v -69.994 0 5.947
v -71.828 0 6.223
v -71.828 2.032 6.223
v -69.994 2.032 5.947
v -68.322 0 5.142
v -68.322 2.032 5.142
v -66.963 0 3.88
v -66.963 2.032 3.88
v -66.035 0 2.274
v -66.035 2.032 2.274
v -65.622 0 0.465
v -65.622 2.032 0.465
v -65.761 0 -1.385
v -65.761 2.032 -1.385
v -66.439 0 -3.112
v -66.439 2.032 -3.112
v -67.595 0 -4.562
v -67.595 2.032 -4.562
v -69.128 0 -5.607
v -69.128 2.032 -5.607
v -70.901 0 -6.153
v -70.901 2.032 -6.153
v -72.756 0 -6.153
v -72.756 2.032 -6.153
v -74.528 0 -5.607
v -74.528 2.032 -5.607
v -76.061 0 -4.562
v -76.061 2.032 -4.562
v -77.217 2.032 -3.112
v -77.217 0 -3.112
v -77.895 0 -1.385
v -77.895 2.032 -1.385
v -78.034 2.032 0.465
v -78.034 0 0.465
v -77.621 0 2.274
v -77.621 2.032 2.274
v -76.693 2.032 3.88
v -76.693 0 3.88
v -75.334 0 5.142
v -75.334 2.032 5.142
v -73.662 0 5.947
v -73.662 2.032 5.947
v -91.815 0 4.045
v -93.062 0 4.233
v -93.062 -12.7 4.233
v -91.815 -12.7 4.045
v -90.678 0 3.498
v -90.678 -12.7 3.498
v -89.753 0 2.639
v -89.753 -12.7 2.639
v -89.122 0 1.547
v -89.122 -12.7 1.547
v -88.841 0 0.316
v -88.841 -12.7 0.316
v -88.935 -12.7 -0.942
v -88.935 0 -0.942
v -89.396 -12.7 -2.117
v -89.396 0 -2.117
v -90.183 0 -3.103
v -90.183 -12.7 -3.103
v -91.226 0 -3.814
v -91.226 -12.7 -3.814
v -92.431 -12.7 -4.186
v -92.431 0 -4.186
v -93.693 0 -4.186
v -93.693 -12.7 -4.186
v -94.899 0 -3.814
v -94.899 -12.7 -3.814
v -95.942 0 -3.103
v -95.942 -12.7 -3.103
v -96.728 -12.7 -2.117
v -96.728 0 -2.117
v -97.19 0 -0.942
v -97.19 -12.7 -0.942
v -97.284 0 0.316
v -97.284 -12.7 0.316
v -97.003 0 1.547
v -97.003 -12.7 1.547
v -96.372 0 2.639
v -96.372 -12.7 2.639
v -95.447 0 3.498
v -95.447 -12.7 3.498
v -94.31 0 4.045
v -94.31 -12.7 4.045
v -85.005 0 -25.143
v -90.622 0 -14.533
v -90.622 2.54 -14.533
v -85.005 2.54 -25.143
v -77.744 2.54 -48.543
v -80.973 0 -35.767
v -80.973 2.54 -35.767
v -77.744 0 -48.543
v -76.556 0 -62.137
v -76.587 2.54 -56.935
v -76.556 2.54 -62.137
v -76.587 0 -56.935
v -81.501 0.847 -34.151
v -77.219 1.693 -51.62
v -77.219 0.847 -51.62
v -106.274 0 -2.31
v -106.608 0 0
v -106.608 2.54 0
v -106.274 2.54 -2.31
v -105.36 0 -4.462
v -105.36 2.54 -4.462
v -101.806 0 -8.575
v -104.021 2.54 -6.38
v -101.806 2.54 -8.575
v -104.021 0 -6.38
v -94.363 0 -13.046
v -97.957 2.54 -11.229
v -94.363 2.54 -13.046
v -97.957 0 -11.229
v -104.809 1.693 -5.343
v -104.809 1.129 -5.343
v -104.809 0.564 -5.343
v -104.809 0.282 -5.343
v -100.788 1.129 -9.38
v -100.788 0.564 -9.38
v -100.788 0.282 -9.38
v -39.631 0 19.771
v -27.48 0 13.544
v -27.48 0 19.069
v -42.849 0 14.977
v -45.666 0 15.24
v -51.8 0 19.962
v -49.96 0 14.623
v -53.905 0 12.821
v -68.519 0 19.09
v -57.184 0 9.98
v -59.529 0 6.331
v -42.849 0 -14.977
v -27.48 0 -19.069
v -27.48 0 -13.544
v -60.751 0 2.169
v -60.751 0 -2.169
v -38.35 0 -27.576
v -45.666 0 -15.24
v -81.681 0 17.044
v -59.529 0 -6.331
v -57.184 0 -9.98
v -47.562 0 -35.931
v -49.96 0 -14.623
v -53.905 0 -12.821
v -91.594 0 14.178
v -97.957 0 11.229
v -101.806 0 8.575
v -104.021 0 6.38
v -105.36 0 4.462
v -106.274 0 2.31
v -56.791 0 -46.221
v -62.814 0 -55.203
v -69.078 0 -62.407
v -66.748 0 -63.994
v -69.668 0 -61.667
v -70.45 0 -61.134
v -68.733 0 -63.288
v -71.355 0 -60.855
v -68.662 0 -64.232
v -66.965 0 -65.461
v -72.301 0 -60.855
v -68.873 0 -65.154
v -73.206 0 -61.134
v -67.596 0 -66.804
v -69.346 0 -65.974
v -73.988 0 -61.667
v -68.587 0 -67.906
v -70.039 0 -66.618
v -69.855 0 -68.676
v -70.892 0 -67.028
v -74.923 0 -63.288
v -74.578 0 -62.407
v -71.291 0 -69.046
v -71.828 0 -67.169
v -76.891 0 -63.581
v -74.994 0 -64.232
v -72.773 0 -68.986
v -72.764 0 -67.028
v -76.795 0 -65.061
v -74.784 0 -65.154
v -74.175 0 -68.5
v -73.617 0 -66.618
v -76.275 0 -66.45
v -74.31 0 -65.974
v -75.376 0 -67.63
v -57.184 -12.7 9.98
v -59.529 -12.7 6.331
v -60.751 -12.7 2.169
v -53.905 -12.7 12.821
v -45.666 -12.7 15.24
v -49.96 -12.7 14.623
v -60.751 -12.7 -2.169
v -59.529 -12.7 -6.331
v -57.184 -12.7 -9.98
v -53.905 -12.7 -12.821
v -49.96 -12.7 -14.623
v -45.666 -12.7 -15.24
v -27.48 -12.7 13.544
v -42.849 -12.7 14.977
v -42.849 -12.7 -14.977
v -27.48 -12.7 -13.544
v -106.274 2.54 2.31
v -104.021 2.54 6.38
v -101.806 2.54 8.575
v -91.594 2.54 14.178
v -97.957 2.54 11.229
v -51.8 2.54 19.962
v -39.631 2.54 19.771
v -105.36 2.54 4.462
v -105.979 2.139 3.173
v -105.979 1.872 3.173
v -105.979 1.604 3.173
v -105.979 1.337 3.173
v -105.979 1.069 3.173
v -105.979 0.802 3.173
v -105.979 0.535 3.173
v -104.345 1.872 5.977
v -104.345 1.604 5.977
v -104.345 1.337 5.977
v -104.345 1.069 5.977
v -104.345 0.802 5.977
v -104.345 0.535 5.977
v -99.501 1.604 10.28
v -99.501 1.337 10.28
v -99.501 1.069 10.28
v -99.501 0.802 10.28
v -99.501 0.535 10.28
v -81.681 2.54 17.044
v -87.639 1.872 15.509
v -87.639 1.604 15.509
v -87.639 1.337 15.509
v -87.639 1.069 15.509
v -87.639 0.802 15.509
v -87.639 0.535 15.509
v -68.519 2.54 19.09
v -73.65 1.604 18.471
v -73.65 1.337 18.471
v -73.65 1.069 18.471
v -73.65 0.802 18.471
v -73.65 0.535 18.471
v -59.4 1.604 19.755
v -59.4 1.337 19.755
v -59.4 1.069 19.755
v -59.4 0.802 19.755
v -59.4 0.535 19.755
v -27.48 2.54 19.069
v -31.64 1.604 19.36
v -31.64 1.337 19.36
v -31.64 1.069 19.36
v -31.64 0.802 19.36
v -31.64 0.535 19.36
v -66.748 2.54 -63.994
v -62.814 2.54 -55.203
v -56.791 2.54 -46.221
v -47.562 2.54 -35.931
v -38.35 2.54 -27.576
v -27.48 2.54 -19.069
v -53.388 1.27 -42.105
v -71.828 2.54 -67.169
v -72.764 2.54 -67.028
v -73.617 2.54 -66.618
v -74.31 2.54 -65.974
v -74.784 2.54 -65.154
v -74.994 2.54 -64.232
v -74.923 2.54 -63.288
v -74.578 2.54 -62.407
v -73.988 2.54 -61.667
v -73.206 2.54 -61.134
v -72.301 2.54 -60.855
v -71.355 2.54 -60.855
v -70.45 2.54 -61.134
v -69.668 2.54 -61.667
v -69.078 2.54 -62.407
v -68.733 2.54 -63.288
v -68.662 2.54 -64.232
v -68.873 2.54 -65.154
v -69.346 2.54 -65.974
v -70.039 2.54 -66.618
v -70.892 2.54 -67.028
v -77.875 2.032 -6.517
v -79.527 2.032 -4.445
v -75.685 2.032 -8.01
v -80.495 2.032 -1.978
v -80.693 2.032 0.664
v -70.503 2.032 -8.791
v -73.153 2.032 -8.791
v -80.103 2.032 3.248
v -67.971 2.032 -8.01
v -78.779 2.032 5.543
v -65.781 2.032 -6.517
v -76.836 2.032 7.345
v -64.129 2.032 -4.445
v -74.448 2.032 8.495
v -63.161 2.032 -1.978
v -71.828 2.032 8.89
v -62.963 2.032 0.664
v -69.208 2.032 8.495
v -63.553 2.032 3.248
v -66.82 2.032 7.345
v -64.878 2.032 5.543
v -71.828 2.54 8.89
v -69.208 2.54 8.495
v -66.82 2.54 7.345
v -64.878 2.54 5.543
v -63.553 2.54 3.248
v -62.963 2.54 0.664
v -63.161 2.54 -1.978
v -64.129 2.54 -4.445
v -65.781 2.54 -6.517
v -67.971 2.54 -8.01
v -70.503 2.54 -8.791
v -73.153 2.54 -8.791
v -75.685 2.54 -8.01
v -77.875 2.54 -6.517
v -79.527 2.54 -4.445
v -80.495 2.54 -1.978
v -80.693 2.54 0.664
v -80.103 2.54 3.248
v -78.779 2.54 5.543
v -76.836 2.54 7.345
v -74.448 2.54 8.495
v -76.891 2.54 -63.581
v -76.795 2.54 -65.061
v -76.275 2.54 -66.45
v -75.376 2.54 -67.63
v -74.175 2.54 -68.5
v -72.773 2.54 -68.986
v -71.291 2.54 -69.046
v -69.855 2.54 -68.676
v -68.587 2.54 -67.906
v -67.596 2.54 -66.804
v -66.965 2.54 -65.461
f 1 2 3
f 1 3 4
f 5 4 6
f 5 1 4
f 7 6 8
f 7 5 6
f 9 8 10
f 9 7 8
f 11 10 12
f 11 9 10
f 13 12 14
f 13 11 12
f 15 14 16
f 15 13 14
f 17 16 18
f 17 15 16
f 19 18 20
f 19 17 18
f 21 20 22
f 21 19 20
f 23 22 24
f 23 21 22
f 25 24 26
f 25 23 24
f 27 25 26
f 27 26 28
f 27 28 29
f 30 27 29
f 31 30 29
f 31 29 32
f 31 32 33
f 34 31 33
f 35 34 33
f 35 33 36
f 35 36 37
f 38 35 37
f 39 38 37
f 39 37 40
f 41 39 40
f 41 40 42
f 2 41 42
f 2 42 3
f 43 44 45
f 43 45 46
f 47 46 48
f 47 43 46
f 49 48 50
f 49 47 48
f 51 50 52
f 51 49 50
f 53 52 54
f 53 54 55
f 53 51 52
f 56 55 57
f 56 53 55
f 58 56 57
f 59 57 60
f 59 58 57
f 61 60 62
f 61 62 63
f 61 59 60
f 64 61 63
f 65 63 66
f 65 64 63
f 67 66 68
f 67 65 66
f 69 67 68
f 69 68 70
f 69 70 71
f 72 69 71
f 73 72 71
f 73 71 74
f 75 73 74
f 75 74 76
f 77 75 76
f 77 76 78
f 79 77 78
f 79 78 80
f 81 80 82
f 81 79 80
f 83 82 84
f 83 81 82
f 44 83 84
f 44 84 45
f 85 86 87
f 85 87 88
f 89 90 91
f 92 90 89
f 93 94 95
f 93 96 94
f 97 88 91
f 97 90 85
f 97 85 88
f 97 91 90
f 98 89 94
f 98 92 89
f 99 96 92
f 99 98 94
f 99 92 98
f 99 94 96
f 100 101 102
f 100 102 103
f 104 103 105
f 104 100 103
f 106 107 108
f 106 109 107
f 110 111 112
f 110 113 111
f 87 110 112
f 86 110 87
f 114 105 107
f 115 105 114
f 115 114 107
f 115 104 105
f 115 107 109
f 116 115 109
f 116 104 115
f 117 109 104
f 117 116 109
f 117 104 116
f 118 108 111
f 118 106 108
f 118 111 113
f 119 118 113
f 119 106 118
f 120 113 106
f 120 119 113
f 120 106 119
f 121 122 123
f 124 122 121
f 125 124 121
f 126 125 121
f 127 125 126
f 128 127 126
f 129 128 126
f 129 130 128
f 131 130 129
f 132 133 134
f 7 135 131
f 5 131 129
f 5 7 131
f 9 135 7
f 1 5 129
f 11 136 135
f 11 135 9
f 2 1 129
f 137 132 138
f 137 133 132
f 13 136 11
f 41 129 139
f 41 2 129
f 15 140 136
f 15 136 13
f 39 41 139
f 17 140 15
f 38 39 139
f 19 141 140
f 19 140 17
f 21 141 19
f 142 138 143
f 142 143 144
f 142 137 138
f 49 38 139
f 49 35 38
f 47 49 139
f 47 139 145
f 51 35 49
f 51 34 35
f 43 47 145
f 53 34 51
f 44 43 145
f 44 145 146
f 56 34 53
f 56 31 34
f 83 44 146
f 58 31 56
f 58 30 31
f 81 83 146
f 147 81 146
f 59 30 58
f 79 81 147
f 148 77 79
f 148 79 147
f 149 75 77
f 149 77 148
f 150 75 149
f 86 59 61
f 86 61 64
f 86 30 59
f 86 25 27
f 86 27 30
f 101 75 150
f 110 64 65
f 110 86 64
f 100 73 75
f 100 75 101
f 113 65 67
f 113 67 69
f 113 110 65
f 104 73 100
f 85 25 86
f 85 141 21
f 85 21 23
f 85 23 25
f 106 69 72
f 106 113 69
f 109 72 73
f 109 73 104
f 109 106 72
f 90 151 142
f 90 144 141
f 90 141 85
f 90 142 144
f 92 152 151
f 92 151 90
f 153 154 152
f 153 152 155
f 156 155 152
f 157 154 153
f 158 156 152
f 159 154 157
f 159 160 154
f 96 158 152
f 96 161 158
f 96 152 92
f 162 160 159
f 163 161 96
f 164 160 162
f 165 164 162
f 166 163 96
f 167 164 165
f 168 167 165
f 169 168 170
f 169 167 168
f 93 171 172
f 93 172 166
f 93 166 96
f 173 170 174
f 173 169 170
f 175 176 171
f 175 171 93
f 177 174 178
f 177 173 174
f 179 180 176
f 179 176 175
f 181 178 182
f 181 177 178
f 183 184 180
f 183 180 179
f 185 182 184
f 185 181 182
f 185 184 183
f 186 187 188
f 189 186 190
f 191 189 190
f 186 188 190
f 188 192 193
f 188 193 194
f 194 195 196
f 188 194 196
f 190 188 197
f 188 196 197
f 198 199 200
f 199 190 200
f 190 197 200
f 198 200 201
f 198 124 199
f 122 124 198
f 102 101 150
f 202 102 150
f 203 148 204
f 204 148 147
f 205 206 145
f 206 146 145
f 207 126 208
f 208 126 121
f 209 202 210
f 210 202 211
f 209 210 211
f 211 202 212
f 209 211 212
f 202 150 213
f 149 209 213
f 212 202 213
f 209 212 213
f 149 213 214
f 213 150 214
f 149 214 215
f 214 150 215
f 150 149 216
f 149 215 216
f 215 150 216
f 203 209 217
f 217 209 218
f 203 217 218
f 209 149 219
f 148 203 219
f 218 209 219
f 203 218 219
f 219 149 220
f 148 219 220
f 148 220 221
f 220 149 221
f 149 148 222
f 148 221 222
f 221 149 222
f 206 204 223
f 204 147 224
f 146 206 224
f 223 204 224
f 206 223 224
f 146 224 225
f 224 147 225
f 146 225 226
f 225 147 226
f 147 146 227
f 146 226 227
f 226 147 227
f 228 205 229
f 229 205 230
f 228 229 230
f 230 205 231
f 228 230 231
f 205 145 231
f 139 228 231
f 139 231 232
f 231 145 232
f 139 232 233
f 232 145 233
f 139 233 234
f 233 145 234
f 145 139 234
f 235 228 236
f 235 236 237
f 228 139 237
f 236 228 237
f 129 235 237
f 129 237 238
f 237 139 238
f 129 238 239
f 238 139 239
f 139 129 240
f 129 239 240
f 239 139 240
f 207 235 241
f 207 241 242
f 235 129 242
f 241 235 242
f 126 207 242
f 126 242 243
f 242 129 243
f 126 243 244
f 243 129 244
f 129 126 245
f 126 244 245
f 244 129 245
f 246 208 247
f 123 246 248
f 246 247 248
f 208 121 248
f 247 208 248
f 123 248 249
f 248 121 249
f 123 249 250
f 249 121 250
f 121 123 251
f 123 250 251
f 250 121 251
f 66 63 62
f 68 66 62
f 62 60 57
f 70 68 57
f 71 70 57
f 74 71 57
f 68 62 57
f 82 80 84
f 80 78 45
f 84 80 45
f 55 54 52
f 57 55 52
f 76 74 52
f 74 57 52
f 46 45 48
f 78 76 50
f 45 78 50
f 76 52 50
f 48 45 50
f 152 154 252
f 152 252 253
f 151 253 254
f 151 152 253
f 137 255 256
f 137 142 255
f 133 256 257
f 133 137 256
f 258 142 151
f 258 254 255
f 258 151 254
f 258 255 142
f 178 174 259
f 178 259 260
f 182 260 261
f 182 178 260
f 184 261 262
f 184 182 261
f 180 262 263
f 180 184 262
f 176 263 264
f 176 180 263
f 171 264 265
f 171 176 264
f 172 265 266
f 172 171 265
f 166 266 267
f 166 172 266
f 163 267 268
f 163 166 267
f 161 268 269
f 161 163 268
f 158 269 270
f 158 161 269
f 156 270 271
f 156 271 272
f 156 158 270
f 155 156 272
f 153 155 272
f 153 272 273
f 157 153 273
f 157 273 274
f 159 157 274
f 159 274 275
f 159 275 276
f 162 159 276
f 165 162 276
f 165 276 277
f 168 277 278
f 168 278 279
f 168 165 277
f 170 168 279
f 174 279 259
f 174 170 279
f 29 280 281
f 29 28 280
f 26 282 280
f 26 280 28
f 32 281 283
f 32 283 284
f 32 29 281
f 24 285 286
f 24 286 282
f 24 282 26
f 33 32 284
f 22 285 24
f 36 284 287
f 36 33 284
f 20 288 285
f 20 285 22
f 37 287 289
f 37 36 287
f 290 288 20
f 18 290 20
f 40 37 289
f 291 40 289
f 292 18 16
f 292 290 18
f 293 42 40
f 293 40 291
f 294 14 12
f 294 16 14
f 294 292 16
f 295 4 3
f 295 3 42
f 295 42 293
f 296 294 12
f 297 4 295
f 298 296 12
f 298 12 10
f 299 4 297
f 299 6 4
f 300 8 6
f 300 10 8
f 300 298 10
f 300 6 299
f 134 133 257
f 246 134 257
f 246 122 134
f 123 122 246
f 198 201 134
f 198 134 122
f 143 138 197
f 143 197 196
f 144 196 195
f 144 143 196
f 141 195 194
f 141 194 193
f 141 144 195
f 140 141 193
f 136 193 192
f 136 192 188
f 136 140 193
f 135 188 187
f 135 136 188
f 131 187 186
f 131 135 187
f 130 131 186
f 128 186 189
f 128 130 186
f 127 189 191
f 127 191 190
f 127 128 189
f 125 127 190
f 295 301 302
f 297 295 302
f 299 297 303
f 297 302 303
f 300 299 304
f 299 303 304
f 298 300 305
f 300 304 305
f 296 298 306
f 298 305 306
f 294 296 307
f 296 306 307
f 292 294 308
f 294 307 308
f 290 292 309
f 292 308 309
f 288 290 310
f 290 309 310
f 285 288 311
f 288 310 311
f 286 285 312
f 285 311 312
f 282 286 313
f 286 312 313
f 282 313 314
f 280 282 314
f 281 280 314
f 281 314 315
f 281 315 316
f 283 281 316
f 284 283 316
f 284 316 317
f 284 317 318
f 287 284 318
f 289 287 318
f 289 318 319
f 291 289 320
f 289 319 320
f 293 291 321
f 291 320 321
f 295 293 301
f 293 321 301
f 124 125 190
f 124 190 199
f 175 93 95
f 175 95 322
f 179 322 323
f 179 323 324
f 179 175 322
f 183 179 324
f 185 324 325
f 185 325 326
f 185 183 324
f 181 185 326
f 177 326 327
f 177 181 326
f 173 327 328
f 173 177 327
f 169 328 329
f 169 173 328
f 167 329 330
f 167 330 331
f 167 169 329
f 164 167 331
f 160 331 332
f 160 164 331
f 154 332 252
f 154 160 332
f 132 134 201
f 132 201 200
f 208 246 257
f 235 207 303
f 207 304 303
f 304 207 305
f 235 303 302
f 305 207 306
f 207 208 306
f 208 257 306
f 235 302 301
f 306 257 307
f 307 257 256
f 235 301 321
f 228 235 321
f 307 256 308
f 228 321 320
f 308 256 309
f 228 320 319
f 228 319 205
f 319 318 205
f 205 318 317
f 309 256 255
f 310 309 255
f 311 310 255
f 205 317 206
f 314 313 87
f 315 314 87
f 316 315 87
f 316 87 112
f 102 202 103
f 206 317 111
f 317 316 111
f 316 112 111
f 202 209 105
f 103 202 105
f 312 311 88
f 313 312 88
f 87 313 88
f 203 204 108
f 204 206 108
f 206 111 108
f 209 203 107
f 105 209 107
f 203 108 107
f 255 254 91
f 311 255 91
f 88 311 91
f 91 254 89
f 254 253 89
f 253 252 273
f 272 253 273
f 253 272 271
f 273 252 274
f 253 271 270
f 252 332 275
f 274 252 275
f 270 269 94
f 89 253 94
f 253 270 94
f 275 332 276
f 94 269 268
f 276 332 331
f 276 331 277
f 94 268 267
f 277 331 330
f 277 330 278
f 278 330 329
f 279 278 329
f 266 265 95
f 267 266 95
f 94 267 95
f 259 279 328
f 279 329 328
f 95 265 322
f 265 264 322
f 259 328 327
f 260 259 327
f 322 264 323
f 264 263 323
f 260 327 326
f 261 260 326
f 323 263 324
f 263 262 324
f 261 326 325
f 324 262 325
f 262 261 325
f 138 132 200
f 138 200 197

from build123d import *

# Parameters (mm, degrees)
SKETCH1_R           = 6.223
SKETCH1_R_2         = 3.175
BOSS_EXTRUDE1_DEPTH = 2.54
SKETCH1_3_R         = 4.233333333
BOSS_EXTRUDE2_DEPTH = 12.7
SKETCH2_R           = 8.89
CUT_EXTRUDE2_DEPTH  = 0.508


with BuildPart() as part:
    # Sketch1 → Boss-Extrude1 (new body)
    with BuildSketch(Plane(origin=(0, 0, 0), x_dir=(1, 0, 0), z_dir=(0, 1, 0))):
        with BuildLine():
            add(Edge.make_bspline(
                [(-106.608177043, 0), (-106.607181853, 0.336221439), (-106.553109217, 1.172470844), (-106.231145111, 2.643099261), (-105.439203383, 4.475217401), (-104.022724766, 6.504348411), (-101.933239026, 8.571651325), (-99.191911488, 10.567556696), (-95.844996836, 12.426747292), (-92.90409582, 13.696332592), (-91.099565345, 14.363844596), (-90.622228407, 14.533411548)],
                knots=[0.5, 0.5, 0.5, 0.5, 0.502166769, 0.505390167, 0.509655974, 0.514947682, 0.521244711, 0.528520886, 0.536744945, 0.54588136, 0.54914681, 0.54914681, 0.54914681, 0.54914681], degree=3))
            add(Edge.make_bspline(
                [(-106.608177043, 0), (-106.607181853, -0.336221439), (-106.553109217, -1.172470844), (-106.231145111, -2.643099261), (-105.439203383, -4.475217401), (-104.022724766, -6.504348411), (-101.933239026, -8.571651325), (-99.191911488, -10.567556696), (-95.844996836, -12.426747292), (-91.942526077, -14.111441704), (-87.531895483, -15.599318155), (-82.657100659, -16.877133316), (-77.359343302, -17.937435613), (-71.677800746, -18.776740565), (-65.650341253, -19.395460579), (-59.313785065, -19.796574023), (-52.704246728, -19.986276309), (-45.857195612, -19.97286583), (-38.807557342, -19.767322463), (-32.659211886, -19.439565325), (-28.865800162, -19.174037811), (-27.479757553, -19.069204536)],
                knots=[0.5, 0.5, 0.5, 0.5, 0.502166769, 0.505390167, 0.509655974, 0.514947682, 0.521244711, 0.528520886, 0.536744945, 0.54588136, 0.555890751, 0.566730119, 0.57835299, 0.590709588, 0.603747039, 0.617409572, 0.631638768, 0.646373793, 0.661551658, 0.677107483, 0.686069724, 0.686069724, 0.686069724, 0.686069724], degree=3))
            Line((-27.479757553, -19.069204536), (-27.479757553, 19.069204536))
            add(Edge.make_bspline(
                [(-66.748032241, 63.994278454), (-59.662783709, 42.677267871), (-27.479757553, 19.069204536)],
                knots=[0, 0, 0, 1, 1, 1], degree=2))
            ThreePointArc((-66.748032241, 63.994278454), (-72.773341431, 68.985549888), (-76.556217491, 62.136682092))
            add(Edge.make_bspline(
                [(-90.622228407, 14.533411548), (-78.676623194, 33.624035256), (-75.814032891, 56.696401983), (-76.556217491, 62.136682092)],
                knots=[0, 0, 0, 0, 1, 1, 1, 1], degree=3))
        make_face()
        with Locations((-71.828032241, 0)):
            Circle(SKETCH1_R, mode=Mode.SUBTRACT)
        with Locations((-71.828032241, 63.994278454)):
            Circle(SKETCH1_R_2, mode=Mode.SUBTRACT)
    extrude(amount=BOSS_EXTRUDE1_DEPTH)

    # Sketch1<3> → Boss-Extrude2 (add)
    with BuildSketch(Plane(origin=(0, 0, 0), x_dir=(1, 0, 0), z_dir=(0, 1, 0))):
        with Locations((-93.062306932, 0)):
            Circle(SKETCH1_3_R)
        with BuildLine():
            Line((-45.666032241, -15.24), (-27.479757553, -13.544433585))
            Line((-27.479757553, -13.544433585), (-27.479757553, 13.544433585))
            Line((-27.479757553, 13.544433585), (-45.666032241, 15.24))
            ThreePointArc((-45.666032241, 15.24), (-60.906032241, 0), (-45.666032241, -15.24))
        make_face()
    extrude(amount=-BOSS_EXTRUDE2_DEPTH)

    # Sketch2 → Cut-Extrude2 (cut)
    with BuildSketch(Plane(origin=(0, 2.54, 0), x_dir=(1, 0, 0), z_dir=(0, 1, 0))):
        with Locations((-71.828032241, 0)):
            Circle(SKETCH2_R)
    extrude(amount=-CUT_EXTRUDE2_DEPTH, mode=Mode.SUBTRACT)


solid = part.part
